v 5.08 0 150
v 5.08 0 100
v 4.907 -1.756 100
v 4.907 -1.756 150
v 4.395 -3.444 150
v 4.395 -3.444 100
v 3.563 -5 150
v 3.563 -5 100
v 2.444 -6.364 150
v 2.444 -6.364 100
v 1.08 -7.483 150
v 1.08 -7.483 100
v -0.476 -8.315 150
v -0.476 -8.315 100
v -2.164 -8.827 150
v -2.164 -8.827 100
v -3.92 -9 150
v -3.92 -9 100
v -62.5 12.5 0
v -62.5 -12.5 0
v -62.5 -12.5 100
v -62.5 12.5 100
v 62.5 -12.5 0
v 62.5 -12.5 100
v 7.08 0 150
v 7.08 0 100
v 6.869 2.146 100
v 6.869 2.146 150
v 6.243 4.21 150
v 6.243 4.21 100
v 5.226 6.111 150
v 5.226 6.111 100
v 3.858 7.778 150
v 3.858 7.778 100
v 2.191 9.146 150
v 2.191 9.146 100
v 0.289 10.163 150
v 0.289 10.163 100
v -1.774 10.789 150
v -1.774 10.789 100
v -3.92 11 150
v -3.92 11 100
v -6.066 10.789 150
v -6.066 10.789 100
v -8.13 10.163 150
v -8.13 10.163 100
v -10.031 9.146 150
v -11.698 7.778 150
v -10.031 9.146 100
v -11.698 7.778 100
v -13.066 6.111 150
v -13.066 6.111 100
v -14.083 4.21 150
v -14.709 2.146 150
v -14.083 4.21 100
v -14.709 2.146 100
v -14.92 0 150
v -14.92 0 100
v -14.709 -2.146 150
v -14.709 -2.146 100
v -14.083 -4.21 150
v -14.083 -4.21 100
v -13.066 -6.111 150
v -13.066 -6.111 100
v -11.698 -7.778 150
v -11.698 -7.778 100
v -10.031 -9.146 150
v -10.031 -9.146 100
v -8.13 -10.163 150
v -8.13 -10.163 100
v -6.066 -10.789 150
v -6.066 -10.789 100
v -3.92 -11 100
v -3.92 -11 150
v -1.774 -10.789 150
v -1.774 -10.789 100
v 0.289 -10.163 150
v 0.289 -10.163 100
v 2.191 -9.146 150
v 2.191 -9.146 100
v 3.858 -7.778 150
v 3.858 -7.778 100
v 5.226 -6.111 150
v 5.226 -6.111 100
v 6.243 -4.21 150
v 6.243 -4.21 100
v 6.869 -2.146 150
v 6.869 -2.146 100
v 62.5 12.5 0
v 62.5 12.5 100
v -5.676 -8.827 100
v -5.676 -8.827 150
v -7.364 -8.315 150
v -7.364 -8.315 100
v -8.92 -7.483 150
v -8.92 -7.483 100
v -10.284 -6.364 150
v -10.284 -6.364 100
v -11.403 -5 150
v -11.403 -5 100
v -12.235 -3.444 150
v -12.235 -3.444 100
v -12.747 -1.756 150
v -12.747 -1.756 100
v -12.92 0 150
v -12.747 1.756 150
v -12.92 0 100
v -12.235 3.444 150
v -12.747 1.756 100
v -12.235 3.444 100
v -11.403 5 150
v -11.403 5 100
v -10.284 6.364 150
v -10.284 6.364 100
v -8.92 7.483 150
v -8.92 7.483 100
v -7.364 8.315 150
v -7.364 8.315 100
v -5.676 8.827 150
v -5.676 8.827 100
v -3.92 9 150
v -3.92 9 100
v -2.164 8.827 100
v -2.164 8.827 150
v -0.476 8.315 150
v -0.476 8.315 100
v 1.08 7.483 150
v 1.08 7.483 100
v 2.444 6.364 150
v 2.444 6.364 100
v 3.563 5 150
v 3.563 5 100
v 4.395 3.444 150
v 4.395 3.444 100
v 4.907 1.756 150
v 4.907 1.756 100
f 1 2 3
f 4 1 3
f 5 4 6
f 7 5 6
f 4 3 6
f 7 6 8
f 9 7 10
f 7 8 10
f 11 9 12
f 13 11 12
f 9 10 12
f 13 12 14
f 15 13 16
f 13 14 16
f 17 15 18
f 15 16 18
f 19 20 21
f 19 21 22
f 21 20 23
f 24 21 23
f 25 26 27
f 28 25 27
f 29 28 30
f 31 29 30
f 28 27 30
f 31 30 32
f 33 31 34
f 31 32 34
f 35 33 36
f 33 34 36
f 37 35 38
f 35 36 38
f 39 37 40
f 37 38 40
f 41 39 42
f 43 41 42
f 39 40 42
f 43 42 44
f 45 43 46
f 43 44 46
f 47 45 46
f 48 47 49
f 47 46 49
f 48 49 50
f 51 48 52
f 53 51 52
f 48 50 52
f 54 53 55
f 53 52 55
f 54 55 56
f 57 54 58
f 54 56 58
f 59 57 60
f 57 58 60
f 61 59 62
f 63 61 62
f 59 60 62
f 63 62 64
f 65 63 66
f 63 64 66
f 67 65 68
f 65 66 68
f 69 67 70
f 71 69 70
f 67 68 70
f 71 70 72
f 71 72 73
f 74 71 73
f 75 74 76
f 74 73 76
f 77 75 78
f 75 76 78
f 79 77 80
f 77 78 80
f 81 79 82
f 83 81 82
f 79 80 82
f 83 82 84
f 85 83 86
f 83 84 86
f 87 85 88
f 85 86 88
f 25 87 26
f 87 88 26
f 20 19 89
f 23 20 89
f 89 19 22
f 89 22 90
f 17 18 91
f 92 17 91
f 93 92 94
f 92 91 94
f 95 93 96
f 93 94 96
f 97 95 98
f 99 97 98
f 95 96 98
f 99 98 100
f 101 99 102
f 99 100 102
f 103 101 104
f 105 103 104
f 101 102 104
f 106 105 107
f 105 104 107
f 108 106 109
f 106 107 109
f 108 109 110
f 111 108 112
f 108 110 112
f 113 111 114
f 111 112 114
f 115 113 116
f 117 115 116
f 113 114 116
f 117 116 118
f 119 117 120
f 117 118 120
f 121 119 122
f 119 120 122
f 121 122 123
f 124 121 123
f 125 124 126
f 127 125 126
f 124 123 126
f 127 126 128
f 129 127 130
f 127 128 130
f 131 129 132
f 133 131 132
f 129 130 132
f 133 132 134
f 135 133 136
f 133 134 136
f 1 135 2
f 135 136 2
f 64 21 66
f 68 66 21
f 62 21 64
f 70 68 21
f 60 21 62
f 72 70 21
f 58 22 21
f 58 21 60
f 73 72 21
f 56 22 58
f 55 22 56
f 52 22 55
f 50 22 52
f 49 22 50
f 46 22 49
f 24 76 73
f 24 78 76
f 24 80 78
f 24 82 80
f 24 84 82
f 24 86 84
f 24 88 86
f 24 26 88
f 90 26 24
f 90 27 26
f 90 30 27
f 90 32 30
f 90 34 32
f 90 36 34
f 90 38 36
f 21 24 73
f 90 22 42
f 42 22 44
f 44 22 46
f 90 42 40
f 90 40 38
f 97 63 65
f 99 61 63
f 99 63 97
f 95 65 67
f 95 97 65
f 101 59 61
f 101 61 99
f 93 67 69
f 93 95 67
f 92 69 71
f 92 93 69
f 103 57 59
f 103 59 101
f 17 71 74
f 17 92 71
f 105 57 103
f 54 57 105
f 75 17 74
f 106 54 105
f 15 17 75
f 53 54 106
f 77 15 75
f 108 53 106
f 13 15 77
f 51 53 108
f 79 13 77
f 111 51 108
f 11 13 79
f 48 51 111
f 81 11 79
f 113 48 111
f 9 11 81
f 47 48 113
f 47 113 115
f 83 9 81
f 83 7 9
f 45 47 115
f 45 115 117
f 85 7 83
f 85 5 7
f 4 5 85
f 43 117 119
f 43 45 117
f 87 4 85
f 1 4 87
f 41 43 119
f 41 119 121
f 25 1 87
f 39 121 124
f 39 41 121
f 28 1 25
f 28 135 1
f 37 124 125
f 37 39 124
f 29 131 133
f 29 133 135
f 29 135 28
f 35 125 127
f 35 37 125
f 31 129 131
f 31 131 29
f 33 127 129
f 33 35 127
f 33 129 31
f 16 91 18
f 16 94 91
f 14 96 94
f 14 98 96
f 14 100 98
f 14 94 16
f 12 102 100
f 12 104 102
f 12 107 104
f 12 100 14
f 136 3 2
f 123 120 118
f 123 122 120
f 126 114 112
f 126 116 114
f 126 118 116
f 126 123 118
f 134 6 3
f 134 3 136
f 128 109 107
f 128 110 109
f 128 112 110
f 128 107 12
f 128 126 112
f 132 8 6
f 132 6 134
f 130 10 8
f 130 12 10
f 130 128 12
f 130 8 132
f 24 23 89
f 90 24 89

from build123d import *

# Parameters (mm, degrees)
F0_W     = 125
F0_H     = 25
F1_DEPTH = 100
F3_DEPTH = 50


with BuildPart() as f1:
    # F0 (on Top) → F1 (new body)
    with BuildSketch(Plane.XY):
        Rectangle(F0_W, F0_H)
    extrude(amount=F1_DEPTH)

    # F2 (on face) → F3 (join)
    with BuildSketch(Plane.XY.offset(100)):
        with BuildLine():
            Line((-3.9200801402, 9), (-3.9200801402, 11))
            ThreePointArc((-3.9200801402, 11), (-14.9200801402, 0), (-3.9200801402, -11))
            Line((-3.9200801402, -11), (-3.9200801402, -9))
            ThreePointArc((-3.9200801402, -9), (-12.9200801402, 0), (-3.9200801402, 9))
        make_face()
        with BuildLine():
            ThreePointArc((7.0799198598, 0), (3.8580944528, 7.7781745931), (-3.9200801402, 11))
            Line((-3.9200801402, 11), (-3.9200801402, 9))
            ThreePointArc((-3.9200801402, 9), (2.4438808904, 6.3639610307), (5.0799198598, 0))
            ThreePointArc((5.0799198598, 0), (2.4438808904, -6.3639610307), (-3.9200801402, -9))
            Line((-3.9200801402, -9), (-3.9200801402, -11))
            ThreePointArc((-3.9200801402, -11), (3.8580944528, -7.7781745931), (7.0799198598, 0))
        make_face()
    extrude(amount=F3_DEPTH)


solid = f1.part
